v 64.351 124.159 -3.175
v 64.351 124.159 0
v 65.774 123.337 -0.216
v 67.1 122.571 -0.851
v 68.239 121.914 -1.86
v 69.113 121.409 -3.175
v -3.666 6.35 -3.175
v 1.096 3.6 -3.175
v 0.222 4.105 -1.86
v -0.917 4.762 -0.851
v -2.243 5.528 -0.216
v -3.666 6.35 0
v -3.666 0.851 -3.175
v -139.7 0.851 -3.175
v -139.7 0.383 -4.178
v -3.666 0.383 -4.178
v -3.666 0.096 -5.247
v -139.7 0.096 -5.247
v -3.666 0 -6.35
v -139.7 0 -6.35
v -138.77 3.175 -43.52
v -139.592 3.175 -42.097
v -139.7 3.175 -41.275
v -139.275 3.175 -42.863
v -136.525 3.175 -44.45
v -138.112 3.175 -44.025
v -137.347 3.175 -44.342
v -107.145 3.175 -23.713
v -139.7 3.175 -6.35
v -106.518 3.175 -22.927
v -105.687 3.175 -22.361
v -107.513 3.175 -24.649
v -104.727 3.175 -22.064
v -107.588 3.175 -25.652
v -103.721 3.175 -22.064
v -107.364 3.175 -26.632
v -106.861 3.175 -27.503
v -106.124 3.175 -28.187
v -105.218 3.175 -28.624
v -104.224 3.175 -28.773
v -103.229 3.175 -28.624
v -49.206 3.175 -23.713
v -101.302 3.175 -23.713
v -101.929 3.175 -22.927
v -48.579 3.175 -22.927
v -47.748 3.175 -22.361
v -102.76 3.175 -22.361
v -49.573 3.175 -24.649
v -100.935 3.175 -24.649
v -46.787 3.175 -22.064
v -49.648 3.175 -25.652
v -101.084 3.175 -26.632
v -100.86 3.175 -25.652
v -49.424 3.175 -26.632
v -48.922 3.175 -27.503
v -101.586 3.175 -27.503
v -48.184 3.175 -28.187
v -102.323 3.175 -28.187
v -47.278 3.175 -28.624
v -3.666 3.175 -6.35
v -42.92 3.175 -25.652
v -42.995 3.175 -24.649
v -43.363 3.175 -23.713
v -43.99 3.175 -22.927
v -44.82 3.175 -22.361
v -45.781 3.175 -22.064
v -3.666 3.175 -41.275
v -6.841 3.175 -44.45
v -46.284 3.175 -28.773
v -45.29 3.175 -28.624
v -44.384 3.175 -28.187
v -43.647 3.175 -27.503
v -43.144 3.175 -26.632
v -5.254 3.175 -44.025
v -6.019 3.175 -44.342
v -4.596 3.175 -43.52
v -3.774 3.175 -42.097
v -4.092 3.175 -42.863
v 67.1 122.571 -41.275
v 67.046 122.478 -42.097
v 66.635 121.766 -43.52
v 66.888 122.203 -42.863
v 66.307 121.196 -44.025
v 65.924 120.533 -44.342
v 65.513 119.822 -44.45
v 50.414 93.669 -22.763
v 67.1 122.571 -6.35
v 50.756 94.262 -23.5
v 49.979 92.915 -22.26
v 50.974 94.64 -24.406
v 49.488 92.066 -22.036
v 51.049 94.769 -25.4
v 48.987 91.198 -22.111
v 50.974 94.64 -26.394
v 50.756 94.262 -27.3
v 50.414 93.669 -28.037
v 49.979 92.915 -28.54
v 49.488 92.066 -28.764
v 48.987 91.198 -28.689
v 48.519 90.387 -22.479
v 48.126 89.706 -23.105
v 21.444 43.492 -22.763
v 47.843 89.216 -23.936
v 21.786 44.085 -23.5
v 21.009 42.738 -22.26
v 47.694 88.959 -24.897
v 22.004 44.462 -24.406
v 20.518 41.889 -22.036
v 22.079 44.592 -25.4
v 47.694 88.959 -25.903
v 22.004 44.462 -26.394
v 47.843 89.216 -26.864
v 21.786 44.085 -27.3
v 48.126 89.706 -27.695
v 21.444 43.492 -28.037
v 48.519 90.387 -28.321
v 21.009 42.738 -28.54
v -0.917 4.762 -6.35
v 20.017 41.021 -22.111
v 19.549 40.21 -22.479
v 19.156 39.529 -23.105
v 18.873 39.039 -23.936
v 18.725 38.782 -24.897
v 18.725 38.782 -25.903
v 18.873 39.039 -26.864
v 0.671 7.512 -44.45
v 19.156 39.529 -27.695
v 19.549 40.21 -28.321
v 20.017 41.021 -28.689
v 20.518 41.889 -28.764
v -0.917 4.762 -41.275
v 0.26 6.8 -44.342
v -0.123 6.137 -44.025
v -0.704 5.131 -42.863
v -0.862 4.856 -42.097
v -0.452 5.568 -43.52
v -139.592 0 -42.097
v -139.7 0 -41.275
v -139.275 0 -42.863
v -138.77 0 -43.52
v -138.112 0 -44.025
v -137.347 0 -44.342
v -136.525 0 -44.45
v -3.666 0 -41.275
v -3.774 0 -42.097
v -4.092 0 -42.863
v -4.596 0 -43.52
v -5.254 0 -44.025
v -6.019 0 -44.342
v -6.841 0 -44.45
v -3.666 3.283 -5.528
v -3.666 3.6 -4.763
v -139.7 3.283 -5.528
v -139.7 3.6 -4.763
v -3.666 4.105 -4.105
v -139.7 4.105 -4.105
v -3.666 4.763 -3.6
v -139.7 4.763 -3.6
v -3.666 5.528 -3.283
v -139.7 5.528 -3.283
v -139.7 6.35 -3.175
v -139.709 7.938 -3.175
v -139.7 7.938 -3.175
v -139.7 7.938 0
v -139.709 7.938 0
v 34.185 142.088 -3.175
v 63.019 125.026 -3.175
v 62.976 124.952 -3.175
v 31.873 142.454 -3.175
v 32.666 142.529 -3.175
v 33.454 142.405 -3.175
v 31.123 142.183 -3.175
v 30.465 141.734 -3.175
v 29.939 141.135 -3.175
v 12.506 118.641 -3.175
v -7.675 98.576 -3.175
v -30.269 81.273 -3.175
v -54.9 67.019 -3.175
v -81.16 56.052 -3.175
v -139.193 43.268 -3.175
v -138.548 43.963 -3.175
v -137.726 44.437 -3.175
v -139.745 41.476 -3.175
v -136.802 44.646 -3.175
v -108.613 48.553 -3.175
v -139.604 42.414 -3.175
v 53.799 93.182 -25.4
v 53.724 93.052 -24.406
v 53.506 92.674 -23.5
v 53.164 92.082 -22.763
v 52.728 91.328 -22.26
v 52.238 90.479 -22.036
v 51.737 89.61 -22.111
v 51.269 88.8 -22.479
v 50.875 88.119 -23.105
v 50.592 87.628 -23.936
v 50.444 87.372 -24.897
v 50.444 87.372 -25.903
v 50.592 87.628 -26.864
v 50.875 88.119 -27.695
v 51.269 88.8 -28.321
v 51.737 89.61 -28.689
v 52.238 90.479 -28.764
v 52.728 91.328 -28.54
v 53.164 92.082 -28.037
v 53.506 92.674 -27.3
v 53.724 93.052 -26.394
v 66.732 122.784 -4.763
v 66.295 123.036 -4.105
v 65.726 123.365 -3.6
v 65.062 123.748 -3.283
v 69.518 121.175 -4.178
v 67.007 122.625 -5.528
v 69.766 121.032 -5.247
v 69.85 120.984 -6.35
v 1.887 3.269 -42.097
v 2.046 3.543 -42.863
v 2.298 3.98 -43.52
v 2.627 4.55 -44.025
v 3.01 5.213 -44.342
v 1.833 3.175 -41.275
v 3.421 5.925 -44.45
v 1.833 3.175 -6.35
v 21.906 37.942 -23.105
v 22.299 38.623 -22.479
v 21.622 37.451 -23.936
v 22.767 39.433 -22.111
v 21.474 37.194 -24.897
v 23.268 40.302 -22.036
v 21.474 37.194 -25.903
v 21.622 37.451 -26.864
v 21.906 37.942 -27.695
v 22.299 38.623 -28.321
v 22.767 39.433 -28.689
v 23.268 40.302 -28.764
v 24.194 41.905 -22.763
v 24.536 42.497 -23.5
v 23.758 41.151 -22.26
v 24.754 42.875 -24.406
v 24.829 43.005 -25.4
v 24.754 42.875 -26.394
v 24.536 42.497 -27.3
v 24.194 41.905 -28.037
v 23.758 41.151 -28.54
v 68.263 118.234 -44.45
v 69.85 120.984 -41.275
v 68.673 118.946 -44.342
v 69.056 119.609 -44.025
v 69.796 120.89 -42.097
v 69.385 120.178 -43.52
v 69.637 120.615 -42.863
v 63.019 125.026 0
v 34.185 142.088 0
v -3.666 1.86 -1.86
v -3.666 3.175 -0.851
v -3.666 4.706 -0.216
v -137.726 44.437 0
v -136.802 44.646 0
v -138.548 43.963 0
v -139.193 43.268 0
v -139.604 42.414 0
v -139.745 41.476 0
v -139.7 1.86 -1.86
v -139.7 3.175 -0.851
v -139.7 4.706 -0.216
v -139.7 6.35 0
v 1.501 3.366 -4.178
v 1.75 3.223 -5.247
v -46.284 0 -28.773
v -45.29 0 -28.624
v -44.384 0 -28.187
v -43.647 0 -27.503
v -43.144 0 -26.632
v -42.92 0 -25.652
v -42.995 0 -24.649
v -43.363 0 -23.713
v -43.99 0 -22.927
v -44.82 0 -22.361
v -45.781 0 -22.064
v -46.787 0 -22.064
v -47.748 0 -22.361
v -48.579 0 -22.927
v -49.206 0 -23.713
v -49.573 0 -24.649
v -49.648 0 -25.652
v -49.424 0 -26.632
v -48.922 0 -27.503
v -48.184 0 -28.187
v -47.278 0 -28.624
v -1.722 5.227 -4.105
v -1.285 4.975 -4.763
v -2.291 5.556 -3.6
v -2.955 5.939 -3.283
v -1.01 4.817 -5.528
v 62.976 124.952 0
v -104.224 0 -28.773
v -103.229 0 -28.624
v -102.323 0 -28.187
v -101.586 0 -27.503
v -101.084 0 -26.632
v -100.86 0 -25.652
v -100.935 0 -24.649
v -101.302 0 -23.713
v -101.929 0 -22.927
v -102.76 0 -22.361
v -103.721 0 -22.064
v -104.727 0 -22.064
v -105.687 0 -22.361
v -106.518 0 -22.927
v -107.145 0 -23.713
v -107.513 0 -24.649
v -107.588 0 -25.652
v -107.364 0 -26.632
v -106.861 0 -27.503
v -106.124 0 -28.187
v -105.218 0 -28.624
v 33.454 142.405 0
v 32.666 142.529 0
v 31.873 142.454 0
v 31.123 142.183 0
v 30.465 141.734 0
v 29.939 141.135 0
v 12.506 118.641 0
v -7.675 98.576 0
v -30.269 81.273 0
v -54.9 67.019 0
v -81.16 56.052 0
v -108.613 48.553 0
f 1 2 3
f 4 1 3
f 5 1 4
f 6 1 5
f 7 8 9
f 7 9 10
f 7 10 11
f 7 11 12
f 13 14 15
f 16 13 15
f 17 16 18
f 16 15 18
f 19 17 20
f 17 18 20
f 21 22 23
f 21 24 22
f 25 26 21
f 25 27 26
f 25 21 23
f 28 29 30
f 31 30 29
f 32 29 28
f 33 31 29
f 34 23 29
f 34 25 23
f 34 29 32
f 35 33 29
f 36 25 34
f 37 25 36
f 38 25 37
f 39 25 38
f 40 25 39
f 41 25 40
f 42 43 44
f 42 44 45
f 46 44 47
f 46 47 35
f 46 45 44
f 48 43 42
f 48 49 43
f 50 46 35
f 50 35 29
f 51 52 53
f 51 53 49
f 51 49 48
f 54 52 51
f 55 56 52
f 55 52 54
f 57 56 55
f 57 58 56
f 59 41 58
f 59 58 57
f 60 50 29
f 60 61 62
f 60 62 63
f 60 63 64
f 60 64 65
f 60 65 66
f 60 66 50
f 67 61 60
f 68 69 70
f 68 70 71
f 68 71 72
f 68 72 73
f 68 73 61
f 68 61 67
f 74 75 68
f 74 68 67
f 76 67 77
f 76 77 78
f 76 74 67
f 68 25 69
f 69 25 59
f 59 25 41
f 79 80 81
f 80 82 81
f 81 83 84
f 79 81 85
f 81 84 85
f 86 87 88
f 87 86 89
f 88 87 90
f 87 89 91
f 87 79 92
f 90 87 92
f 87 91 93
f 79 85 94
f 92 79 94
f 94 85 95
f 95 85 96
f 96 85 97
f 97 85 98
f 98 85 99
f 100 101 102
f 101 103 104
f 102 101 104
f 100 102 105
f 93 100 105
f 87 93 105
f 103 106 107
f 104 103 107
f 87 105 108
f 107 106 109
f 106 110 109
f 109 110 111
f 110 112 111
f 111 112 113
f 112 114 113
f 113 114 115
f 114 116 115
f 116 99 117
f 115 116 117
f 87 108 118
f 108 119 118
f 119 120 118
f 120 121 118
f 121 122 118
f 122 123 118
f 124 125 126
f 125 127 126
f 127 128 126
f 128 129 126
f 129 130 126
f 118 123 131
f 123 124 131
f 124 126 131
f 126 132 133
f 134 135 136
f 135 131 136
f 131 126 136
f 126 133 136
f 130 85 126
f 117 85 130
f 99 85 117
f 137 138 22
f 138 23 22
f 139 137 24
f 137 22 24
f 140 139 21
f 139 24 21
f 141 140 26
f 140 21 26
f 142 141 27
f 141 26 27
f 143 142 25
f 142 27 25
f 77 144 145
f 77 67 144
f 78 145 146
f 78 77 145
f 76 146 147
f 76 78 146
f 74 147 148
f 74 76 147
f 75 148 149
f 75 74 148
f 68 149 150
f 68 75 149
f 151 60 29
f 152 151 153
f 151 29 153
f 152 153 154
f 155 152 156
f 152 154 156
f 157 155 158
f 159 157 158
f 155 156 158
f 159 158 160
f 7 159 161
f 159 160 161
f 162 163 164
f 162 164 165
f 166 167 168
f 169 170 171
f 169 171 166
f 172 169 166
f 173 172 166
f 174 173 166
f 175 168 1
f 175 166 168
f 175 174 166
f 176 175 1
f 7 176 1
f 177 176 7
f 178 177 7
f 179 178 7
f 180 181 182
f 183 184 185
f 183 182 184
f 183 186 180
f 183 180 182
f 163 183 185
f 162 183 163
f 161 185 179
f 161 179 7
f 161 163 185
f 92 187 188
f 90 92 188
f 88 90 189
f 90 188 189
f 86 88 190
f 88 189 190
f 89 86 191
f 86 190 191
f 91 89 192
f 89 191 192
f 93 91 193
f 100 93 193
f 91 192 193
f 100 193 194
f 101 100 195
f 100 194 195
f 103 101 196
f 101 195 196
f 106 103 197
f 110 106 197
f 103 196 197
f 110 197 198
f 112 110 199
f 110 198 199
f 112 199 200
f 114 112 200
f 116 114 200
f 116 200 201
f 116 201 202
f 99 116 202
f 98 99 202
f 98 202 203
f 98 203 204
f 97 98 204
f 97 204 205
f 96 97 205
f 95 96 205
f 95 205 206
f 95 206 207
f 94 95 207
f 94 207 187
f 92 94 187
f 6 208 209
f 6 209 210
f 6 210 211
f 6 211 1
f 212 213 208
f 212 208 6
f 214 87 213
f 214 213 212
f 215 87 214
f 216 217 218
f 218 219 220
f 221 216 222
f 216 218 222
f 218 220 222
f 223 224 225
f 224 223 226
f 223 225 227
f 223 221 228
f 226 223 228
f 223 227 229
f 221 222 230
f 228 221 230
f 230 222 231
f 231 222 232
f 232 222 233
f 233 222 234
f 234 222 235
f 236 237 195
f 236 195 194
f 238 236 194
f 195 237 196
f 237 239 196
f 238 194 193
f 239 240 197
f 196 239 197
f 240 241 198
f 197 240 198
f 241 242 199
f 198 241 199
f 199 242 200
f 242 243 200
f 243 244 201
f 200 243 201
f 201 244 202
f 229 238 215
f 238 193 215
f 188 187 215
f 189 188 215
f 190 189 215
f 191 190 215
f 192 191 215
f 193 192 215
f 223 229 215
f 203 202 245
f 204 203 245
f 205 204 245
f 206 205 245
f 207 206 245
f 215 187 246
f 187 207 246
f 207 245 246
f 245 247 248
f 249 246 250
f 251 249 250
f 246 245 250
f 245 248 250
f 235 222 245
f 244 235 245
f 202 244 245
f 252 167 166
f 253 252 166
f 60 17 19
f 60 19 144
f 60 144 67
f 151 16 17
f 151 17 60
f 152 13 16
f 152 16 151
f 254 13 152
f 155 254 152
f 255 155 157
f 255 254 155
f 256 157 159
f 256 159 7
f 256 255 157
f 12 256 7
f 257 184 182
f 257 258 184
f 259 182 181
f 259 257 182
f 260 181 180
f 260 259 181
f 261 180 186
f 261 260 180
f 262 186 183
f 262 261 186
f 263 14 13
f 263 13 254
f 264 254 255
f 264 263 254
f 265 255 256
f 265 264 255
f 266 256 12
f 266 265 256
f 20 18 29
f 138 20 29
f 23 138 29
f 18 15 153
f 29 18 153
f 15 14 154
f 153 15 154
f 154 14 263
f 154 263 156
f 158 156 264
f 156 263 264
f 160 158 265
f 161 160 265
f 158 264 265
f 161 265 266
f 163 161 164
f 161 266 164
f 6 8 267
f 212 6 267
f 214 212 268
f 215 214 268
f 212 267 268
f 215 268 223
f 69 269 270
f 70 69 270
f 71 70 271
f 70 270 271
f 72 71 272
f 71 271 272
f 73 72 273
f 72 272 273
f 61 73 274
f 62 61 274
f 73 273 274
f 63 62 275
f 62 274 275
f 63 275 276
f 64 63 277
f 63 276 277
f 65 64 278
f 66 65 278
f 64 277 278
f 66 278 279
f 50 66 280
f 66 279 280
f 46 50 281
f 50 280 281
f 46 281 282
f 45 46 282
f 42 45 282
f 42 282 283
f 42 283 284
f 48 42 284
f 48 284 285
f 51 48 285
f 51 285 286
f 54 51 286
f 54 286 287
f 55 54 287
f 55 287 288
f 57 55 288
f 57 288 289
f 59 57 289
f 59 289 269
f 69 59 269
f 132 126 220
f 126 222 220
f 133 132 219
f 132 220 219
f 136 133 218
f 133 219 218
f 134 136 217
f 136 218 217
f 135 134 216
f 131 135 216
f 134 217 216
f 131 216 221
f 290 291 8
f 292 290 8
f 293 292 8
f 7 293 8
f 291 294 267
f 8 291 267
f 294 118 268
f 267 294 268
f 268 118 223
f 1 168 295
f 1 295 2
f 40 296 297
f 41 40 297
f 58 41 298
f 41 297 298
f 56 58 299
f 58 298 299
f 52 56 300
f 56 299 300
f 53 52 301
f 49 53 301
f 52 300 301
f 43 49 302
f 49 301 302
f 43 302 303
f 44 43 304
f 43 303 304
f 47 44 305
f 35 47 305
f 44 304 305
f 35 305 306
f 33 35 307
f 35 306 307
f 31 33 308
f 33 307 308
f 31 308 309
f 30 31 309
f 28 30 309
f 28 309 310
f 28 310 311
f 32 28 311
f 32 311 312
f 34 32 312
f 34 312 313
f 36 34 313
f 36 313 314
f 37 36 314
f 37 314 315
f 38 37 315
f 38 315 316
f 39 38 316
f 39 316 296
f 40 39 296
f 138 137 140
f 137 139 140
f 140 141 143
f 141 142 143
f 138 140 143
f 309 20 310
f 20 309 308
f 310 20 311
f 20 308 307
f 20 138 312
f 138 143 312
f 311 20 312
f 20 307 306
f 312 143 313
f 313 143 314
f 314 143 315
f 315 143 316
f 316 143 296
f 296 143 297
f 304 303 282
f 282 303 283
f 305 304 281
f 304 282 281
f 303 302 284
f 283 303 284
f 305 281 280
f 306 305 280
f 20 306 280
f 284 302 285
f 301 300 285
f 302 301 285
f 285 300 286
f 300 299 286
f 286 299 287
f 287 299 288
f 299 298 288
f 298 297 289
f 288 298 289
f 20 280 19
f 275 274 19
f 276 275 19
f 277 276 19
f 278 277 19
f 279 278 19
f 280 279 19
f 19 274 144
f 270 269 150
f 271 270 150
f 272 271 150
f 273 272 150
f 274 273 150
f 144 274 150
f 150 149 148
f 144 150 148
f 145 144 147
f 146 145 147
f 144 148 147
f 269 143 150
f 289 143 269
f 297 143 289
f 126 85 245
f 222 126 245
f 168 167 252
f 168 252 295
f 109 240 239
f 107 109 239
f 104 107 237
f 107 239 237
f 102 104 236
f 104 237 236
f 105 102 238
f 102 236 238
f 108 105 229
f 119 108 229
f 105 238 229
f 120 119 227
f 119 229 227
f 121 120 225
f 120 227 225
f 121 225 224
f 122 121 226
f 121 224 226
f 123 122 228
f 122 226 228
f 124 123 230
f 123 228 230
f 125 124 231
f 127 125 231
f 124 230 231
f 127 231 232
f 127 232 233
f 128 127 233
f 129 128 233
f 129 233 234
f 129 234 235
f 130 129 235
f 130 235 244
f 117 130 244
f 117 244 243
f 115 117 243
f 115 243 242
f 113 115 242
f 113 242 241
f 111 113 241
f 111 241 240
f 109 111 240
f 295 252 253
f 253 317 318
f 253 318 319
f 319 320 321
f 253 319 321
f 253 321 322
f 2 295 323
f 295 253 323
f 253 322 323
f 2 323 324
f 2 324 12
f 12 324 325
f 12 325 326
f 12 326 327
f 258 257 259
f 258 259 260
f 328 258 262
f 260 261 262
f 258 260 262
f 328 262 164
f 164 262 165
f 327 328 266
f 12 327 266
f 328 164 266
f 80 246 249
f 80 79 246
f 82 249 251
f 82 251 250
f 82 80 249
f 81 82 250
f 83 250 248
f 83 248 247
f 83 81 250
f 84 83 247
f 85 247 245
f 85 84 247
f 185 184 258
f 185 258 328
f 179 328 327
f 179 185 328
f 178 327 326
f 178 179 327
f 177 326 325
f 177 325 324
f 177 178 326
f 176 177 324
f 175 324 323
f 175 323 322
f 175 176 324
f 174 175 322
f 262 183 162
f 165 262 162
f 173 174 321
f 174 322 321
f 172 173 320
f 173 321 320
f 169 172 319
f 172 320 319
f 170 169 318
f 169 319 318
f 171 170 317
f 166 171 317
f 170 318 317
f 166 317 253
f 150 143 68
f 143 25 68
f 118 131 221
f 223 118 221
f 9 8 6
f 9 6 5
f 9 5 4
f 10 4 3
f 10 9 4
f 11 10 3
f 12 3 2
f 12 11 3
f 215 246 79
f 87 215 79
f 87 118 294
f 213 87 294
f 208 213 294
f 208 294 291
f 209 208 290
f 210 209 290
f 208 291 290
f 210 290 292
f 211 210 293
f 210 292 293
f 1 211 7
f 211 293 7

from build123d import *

# Parameters (mm, degrees)
BASE_FLANGE1_START       = -3.175
BASE_FLANGE1_DEPTH       = 3.175
EDGE_FLANGE1_START       = -0.3353435
EDGE_FLANGE1_DEPTH       = 0.3353435
EDGE_FLANGE1_START_2     = -3.175
EDGE_FLANGE1_2_DEPTH     = 3.175
EDGE_FLANGE1_START_3     = -44.45
EDGE_FLANGE1_3_OUTLINE_W = 136.033825791
EDGE_FLANGE1_3_OUTLINE_H = 3.175
EDGE_FLANGE1_3_DEPTH     = 38.1
EDGE_FLANGE1_START_4     = -139.7
EDGE_FLANGE1_4_DEPTH     = 136.033825791
EDGE_FLANGE1_START_5     = 3.666174209
EDGE_FLANGE1_5_DEPTH     = 136.033825791
EDGE_FLANGE1_6_DEPTH     = 146.096388787
EDGE_FLANGE1_START_6     = -69.85
EDGE_FLANGE1_7_DEPTH     = 209.55
FILLET2_R                = 220.82
SKETCH15_R               = 3.3734375
CUT_EXTRUDE1_DEPTH       = 206.261094571
SKETCH16_R               = 3.3734375
CUT_EXTRUDE2_DEPTH       = 206.261094571
FILLET3_R                = 3.175


with BuildPart() as part:
    # Base-Flange1: read off the stored shape, not the designer's step
    # Base-Flange1 outline → Base-Flange1 (new body)
    with BuildSketch(Plane.XY.offset(BASE_FLANGE1_START)):
        Polygon((69.85, 120.983748909), (31.595939562, 143.620651524), (-25.447777456, 44.572661394), (-139.747711611, 44.449974394), (-139.7, 0), (0, 0), align=None)
    extrude(amount=BASE_FLANGE1_DEPTH)

    # Edge-Flange1: read off the stored shape, not the designer's step
    # Edge-Flange1 outline → Edge-Flange1 (cut)
    with BuildSketch(Plane.XY.offset(EDGE_FLANGE1_START)):
        Polygon((-139.7, 7.9375), (-139.708519936, 7.9375), (-139.7, 0), (0, 0), (1.833087105, 3.175), (69.85, 120.983748909), (63.01852425, 125.026285819), (62.975923357, 124.952498909), (64.350738686, 124.158748909), (67.100369343, 122.571248909), (-0.916543552, 4.7625), (-3.666174209, 6.35), (-3.666174209, 3.175), (-139.7, 3.175), align=None)
    extrude(amount=EDGE_FLANGE1_DEPTH, mode=Mode.SUBTRACT)

    # Edge-Flange1 2 outline → Edge-Flange1 2 (cut)
    with BuildSketch(Plane.XY.offset(EDGE_FLANGE1_START_2)):
        Polygon((-139.7, 7.9375), (-139.708519936, 7.9375), (-139.7, 0), align=None)
        Polygon((-3.666174209, 6.35), (-3.666174209, 0), (0, 0), (1.833087105, 3.175), align=None)
        Polygon((64.350738686, 124.158748909), (69.85, 120.983748909), (63.01852425, 125.026285819), (62.975923357, 124.952498909), align=None)
    extrude(amount=EDGE_FLANGE1_2_DEPTH, mode=Mode.SUBTRACT)



with BuildPart() as body_2:
    # Edge-Flange1 3 outline → Edge-Flange1 3 (new body)
    with BuildSketch(Plane.XY.offset(EDGE_FLANGE1_START_3)):
        with Locations((-71.683087105, 1.5875)):
            Rectangle(EDGE_FLANGE1_3_OUTLINE_W, EDGE_FLANGE1_3_OUTLINE_H)
        Polygon((-0.916543552, 4.7625), (1.833087105, 3.175), (69.85, 120.983748909), (67.100369343, 122.571248909), align=None)
    extrude(amount=EDGE_FLANGE1_3_DEPTH)


with BuildPart() as part_1:
    add(part.part)

    add(body_2.part)  # Edge-Flange1 4 merges body 2
    # Edge-Flange1 4 outline → Edge-Flange1 4 (add)
    with BuildSketch(Plane.YZ.offset(EDGE_FLANGE1_START_4)):
        with BuildLine():
            ThreePointArc((0.850738685, -3.175), (0.216371003, -4.706499064), (0, -6.35))
            Line((0, -6.35), (3.175, -6.35))
            ThreePointArc((3.175, -6.35), (4.10493597, -4.10493597), (6.35, -3.175))
            Line((6.35, -3.175), (0.850738685, -3.175))
        make_face()
    extrude(amount=EDGE_FLANGE1_4_DEPTH)

    # Edge-Flange1 5 outline → Edge-Flange1 5 (add)
    with BuildSketch(Plane(origin=(0, 0, 0), x_dir=(0.866025403784418, -0.500000000000036, 0), z_dir=(0.500000000000036, 0.866025403784418, 0)).offset(EDGE_FLANGE1_START_5)):
        with BuildLine():
            ThreePointArc((-0.850738685, 3.175), (-0.216371003, 4.706499064), (0, 6.35))
            Line((0, 6.35), (-3.175, 6.35))
            ThreePointArc((-3.175, 6.35), (-4.10493597, 4.10493597), (-6.35, 3.175))
            Line((-6.35, 3.175), (-0.850738685, 3.175))
        make_face()
    extrude(amount=EDGE_FLANGE1_5_DEPTH)

    # Edge-Flange1 6 outline → Edge-Flange1 6 (cut)
    with BuildSketch(Plane.YZ.offset(EDGE_FLANGE1_START_4)):
        with BuildLine():
            Line((0, -3.175), (0.850738685, -3.175))
            ThreePointArc((0.850738685, -3.175), (3.174999999, -0.850738686), (6.35, 0))
            Line((6.35, 0), (3.175, 0))
            Line((3.175, 0), (3.175, -0.3353435))
            Line((3.175, -0.3353435), (0, -0.3353435))
            Line((0, -0.3353435), (0, -3.175))
        make_face()
    extrude(amount=EDGE_FLANGE1_6_DEPTH, mode=Mode.SUBTRACT)

    # Edge-Flange1 7 outline → Edge-Flange1 7 (cut)
    with BuildSketch(Plane(origin=(0, 0, 0), x_dir=(0.866025403784418, -0.500000000000036, 0), z_dir=(0.500000000000036, 0.866025403784418, 0)).offset(EDGE_FLANGE1_START_6)):
        with BuildLine():
            Line((0, 3.175), (-0.850738685, 3.175))
            ThreePointArc((-0.850738685, 3.175), (-3.174999999, 0.850738686), (-6.35, 0))
            Line((-6.35, 0), (-3.175, 0))
            Line((-3.175, 0), (-3.175, 0.3353435))
            Line((-3.175, 0.3353435), (0, 0.3353435))
            Line((0, 0.3353435), (0, 3.175))
        make_face()
    extrude(amount=EDGE_FLANGE1_7_DEPTH, mode=Mode.SUBTRACT)

    # Fillet2
    # the kernel refuses this fillet: 220.82 mm, written as the material it adds along each edge
    with BuildSketch(Plane(origin=(-25.447777456, 44.572661394, -3.175), x_dir=(0.49907014013952505, 0.8665615934376014, 0), z_dir=(0, 0, 1))) as fillet2_piece_1:
        with BuildLine():
            CenterArc((127.27037084, 220.438748591), FILLET2_R, 213.36733761, 53.265324779)
            Line((-57.149999999, 98.986703653), (0, 0))
            Line((0, 0), (114.3, 0))
        make_face()
    extrude(amount=3.175)

    # Sketch15 → Cut-Extrude1 (cut, through all)
    with BuildSketch(Plane(origin=(0, 0, 0), x_dir=(0, 0, -1), z_dir=(0.8660254037844249, -0.5000000000000239, 3.506248131957107e-15))):
        with Locations(Location((25.4, 104.22382, 0), (0, 0, 90))):
            Circle(SKETCH15_R)
        with Locations(Location((25.4, 46.284161604, 0), (0, 0, 90))):
            Circle(SKETCH15_R)
    extrude(amount=-CUT_EXTRUDE1_DEPTH, mode=Mode.SUBTRACT)

    # Sketch16 → Cut-Extrude2 (cut, through all)
    with BuildSketch(Plane.XZ):
        with Locations(Location((-104.22382, -25.4, 0), (0, 0, 270))):
            Circle(SKETCH16_R)
        with Locations(Location((-46.284161686, -25.4, 0), (0, 0, 270))):
            Circle(SKETCH16_R)
    extrude(amount=-CUT_EXTRUDE2_DEPTH, mode=Mode.SUBTRACT)

    # Fillet3
    fillet3_edges = [part_1.edges().sort_by_distance(p)[0] for p in [
        (31.595939562, 143.620651524, -1.5875),
        (-139.747711611, 44.449974394, -1.5875),
        (-3.666174209, 1.5875, -44.45),
        (-139.7, 1.5875, -44.45),
        (68.475184671, 121.777498909, -44.45),
        (0.458271776, 3.96875, -44.45),
    ]]
    fillet(fillet3_edges, radius=FILLET3_R)


solid = part_1.part
